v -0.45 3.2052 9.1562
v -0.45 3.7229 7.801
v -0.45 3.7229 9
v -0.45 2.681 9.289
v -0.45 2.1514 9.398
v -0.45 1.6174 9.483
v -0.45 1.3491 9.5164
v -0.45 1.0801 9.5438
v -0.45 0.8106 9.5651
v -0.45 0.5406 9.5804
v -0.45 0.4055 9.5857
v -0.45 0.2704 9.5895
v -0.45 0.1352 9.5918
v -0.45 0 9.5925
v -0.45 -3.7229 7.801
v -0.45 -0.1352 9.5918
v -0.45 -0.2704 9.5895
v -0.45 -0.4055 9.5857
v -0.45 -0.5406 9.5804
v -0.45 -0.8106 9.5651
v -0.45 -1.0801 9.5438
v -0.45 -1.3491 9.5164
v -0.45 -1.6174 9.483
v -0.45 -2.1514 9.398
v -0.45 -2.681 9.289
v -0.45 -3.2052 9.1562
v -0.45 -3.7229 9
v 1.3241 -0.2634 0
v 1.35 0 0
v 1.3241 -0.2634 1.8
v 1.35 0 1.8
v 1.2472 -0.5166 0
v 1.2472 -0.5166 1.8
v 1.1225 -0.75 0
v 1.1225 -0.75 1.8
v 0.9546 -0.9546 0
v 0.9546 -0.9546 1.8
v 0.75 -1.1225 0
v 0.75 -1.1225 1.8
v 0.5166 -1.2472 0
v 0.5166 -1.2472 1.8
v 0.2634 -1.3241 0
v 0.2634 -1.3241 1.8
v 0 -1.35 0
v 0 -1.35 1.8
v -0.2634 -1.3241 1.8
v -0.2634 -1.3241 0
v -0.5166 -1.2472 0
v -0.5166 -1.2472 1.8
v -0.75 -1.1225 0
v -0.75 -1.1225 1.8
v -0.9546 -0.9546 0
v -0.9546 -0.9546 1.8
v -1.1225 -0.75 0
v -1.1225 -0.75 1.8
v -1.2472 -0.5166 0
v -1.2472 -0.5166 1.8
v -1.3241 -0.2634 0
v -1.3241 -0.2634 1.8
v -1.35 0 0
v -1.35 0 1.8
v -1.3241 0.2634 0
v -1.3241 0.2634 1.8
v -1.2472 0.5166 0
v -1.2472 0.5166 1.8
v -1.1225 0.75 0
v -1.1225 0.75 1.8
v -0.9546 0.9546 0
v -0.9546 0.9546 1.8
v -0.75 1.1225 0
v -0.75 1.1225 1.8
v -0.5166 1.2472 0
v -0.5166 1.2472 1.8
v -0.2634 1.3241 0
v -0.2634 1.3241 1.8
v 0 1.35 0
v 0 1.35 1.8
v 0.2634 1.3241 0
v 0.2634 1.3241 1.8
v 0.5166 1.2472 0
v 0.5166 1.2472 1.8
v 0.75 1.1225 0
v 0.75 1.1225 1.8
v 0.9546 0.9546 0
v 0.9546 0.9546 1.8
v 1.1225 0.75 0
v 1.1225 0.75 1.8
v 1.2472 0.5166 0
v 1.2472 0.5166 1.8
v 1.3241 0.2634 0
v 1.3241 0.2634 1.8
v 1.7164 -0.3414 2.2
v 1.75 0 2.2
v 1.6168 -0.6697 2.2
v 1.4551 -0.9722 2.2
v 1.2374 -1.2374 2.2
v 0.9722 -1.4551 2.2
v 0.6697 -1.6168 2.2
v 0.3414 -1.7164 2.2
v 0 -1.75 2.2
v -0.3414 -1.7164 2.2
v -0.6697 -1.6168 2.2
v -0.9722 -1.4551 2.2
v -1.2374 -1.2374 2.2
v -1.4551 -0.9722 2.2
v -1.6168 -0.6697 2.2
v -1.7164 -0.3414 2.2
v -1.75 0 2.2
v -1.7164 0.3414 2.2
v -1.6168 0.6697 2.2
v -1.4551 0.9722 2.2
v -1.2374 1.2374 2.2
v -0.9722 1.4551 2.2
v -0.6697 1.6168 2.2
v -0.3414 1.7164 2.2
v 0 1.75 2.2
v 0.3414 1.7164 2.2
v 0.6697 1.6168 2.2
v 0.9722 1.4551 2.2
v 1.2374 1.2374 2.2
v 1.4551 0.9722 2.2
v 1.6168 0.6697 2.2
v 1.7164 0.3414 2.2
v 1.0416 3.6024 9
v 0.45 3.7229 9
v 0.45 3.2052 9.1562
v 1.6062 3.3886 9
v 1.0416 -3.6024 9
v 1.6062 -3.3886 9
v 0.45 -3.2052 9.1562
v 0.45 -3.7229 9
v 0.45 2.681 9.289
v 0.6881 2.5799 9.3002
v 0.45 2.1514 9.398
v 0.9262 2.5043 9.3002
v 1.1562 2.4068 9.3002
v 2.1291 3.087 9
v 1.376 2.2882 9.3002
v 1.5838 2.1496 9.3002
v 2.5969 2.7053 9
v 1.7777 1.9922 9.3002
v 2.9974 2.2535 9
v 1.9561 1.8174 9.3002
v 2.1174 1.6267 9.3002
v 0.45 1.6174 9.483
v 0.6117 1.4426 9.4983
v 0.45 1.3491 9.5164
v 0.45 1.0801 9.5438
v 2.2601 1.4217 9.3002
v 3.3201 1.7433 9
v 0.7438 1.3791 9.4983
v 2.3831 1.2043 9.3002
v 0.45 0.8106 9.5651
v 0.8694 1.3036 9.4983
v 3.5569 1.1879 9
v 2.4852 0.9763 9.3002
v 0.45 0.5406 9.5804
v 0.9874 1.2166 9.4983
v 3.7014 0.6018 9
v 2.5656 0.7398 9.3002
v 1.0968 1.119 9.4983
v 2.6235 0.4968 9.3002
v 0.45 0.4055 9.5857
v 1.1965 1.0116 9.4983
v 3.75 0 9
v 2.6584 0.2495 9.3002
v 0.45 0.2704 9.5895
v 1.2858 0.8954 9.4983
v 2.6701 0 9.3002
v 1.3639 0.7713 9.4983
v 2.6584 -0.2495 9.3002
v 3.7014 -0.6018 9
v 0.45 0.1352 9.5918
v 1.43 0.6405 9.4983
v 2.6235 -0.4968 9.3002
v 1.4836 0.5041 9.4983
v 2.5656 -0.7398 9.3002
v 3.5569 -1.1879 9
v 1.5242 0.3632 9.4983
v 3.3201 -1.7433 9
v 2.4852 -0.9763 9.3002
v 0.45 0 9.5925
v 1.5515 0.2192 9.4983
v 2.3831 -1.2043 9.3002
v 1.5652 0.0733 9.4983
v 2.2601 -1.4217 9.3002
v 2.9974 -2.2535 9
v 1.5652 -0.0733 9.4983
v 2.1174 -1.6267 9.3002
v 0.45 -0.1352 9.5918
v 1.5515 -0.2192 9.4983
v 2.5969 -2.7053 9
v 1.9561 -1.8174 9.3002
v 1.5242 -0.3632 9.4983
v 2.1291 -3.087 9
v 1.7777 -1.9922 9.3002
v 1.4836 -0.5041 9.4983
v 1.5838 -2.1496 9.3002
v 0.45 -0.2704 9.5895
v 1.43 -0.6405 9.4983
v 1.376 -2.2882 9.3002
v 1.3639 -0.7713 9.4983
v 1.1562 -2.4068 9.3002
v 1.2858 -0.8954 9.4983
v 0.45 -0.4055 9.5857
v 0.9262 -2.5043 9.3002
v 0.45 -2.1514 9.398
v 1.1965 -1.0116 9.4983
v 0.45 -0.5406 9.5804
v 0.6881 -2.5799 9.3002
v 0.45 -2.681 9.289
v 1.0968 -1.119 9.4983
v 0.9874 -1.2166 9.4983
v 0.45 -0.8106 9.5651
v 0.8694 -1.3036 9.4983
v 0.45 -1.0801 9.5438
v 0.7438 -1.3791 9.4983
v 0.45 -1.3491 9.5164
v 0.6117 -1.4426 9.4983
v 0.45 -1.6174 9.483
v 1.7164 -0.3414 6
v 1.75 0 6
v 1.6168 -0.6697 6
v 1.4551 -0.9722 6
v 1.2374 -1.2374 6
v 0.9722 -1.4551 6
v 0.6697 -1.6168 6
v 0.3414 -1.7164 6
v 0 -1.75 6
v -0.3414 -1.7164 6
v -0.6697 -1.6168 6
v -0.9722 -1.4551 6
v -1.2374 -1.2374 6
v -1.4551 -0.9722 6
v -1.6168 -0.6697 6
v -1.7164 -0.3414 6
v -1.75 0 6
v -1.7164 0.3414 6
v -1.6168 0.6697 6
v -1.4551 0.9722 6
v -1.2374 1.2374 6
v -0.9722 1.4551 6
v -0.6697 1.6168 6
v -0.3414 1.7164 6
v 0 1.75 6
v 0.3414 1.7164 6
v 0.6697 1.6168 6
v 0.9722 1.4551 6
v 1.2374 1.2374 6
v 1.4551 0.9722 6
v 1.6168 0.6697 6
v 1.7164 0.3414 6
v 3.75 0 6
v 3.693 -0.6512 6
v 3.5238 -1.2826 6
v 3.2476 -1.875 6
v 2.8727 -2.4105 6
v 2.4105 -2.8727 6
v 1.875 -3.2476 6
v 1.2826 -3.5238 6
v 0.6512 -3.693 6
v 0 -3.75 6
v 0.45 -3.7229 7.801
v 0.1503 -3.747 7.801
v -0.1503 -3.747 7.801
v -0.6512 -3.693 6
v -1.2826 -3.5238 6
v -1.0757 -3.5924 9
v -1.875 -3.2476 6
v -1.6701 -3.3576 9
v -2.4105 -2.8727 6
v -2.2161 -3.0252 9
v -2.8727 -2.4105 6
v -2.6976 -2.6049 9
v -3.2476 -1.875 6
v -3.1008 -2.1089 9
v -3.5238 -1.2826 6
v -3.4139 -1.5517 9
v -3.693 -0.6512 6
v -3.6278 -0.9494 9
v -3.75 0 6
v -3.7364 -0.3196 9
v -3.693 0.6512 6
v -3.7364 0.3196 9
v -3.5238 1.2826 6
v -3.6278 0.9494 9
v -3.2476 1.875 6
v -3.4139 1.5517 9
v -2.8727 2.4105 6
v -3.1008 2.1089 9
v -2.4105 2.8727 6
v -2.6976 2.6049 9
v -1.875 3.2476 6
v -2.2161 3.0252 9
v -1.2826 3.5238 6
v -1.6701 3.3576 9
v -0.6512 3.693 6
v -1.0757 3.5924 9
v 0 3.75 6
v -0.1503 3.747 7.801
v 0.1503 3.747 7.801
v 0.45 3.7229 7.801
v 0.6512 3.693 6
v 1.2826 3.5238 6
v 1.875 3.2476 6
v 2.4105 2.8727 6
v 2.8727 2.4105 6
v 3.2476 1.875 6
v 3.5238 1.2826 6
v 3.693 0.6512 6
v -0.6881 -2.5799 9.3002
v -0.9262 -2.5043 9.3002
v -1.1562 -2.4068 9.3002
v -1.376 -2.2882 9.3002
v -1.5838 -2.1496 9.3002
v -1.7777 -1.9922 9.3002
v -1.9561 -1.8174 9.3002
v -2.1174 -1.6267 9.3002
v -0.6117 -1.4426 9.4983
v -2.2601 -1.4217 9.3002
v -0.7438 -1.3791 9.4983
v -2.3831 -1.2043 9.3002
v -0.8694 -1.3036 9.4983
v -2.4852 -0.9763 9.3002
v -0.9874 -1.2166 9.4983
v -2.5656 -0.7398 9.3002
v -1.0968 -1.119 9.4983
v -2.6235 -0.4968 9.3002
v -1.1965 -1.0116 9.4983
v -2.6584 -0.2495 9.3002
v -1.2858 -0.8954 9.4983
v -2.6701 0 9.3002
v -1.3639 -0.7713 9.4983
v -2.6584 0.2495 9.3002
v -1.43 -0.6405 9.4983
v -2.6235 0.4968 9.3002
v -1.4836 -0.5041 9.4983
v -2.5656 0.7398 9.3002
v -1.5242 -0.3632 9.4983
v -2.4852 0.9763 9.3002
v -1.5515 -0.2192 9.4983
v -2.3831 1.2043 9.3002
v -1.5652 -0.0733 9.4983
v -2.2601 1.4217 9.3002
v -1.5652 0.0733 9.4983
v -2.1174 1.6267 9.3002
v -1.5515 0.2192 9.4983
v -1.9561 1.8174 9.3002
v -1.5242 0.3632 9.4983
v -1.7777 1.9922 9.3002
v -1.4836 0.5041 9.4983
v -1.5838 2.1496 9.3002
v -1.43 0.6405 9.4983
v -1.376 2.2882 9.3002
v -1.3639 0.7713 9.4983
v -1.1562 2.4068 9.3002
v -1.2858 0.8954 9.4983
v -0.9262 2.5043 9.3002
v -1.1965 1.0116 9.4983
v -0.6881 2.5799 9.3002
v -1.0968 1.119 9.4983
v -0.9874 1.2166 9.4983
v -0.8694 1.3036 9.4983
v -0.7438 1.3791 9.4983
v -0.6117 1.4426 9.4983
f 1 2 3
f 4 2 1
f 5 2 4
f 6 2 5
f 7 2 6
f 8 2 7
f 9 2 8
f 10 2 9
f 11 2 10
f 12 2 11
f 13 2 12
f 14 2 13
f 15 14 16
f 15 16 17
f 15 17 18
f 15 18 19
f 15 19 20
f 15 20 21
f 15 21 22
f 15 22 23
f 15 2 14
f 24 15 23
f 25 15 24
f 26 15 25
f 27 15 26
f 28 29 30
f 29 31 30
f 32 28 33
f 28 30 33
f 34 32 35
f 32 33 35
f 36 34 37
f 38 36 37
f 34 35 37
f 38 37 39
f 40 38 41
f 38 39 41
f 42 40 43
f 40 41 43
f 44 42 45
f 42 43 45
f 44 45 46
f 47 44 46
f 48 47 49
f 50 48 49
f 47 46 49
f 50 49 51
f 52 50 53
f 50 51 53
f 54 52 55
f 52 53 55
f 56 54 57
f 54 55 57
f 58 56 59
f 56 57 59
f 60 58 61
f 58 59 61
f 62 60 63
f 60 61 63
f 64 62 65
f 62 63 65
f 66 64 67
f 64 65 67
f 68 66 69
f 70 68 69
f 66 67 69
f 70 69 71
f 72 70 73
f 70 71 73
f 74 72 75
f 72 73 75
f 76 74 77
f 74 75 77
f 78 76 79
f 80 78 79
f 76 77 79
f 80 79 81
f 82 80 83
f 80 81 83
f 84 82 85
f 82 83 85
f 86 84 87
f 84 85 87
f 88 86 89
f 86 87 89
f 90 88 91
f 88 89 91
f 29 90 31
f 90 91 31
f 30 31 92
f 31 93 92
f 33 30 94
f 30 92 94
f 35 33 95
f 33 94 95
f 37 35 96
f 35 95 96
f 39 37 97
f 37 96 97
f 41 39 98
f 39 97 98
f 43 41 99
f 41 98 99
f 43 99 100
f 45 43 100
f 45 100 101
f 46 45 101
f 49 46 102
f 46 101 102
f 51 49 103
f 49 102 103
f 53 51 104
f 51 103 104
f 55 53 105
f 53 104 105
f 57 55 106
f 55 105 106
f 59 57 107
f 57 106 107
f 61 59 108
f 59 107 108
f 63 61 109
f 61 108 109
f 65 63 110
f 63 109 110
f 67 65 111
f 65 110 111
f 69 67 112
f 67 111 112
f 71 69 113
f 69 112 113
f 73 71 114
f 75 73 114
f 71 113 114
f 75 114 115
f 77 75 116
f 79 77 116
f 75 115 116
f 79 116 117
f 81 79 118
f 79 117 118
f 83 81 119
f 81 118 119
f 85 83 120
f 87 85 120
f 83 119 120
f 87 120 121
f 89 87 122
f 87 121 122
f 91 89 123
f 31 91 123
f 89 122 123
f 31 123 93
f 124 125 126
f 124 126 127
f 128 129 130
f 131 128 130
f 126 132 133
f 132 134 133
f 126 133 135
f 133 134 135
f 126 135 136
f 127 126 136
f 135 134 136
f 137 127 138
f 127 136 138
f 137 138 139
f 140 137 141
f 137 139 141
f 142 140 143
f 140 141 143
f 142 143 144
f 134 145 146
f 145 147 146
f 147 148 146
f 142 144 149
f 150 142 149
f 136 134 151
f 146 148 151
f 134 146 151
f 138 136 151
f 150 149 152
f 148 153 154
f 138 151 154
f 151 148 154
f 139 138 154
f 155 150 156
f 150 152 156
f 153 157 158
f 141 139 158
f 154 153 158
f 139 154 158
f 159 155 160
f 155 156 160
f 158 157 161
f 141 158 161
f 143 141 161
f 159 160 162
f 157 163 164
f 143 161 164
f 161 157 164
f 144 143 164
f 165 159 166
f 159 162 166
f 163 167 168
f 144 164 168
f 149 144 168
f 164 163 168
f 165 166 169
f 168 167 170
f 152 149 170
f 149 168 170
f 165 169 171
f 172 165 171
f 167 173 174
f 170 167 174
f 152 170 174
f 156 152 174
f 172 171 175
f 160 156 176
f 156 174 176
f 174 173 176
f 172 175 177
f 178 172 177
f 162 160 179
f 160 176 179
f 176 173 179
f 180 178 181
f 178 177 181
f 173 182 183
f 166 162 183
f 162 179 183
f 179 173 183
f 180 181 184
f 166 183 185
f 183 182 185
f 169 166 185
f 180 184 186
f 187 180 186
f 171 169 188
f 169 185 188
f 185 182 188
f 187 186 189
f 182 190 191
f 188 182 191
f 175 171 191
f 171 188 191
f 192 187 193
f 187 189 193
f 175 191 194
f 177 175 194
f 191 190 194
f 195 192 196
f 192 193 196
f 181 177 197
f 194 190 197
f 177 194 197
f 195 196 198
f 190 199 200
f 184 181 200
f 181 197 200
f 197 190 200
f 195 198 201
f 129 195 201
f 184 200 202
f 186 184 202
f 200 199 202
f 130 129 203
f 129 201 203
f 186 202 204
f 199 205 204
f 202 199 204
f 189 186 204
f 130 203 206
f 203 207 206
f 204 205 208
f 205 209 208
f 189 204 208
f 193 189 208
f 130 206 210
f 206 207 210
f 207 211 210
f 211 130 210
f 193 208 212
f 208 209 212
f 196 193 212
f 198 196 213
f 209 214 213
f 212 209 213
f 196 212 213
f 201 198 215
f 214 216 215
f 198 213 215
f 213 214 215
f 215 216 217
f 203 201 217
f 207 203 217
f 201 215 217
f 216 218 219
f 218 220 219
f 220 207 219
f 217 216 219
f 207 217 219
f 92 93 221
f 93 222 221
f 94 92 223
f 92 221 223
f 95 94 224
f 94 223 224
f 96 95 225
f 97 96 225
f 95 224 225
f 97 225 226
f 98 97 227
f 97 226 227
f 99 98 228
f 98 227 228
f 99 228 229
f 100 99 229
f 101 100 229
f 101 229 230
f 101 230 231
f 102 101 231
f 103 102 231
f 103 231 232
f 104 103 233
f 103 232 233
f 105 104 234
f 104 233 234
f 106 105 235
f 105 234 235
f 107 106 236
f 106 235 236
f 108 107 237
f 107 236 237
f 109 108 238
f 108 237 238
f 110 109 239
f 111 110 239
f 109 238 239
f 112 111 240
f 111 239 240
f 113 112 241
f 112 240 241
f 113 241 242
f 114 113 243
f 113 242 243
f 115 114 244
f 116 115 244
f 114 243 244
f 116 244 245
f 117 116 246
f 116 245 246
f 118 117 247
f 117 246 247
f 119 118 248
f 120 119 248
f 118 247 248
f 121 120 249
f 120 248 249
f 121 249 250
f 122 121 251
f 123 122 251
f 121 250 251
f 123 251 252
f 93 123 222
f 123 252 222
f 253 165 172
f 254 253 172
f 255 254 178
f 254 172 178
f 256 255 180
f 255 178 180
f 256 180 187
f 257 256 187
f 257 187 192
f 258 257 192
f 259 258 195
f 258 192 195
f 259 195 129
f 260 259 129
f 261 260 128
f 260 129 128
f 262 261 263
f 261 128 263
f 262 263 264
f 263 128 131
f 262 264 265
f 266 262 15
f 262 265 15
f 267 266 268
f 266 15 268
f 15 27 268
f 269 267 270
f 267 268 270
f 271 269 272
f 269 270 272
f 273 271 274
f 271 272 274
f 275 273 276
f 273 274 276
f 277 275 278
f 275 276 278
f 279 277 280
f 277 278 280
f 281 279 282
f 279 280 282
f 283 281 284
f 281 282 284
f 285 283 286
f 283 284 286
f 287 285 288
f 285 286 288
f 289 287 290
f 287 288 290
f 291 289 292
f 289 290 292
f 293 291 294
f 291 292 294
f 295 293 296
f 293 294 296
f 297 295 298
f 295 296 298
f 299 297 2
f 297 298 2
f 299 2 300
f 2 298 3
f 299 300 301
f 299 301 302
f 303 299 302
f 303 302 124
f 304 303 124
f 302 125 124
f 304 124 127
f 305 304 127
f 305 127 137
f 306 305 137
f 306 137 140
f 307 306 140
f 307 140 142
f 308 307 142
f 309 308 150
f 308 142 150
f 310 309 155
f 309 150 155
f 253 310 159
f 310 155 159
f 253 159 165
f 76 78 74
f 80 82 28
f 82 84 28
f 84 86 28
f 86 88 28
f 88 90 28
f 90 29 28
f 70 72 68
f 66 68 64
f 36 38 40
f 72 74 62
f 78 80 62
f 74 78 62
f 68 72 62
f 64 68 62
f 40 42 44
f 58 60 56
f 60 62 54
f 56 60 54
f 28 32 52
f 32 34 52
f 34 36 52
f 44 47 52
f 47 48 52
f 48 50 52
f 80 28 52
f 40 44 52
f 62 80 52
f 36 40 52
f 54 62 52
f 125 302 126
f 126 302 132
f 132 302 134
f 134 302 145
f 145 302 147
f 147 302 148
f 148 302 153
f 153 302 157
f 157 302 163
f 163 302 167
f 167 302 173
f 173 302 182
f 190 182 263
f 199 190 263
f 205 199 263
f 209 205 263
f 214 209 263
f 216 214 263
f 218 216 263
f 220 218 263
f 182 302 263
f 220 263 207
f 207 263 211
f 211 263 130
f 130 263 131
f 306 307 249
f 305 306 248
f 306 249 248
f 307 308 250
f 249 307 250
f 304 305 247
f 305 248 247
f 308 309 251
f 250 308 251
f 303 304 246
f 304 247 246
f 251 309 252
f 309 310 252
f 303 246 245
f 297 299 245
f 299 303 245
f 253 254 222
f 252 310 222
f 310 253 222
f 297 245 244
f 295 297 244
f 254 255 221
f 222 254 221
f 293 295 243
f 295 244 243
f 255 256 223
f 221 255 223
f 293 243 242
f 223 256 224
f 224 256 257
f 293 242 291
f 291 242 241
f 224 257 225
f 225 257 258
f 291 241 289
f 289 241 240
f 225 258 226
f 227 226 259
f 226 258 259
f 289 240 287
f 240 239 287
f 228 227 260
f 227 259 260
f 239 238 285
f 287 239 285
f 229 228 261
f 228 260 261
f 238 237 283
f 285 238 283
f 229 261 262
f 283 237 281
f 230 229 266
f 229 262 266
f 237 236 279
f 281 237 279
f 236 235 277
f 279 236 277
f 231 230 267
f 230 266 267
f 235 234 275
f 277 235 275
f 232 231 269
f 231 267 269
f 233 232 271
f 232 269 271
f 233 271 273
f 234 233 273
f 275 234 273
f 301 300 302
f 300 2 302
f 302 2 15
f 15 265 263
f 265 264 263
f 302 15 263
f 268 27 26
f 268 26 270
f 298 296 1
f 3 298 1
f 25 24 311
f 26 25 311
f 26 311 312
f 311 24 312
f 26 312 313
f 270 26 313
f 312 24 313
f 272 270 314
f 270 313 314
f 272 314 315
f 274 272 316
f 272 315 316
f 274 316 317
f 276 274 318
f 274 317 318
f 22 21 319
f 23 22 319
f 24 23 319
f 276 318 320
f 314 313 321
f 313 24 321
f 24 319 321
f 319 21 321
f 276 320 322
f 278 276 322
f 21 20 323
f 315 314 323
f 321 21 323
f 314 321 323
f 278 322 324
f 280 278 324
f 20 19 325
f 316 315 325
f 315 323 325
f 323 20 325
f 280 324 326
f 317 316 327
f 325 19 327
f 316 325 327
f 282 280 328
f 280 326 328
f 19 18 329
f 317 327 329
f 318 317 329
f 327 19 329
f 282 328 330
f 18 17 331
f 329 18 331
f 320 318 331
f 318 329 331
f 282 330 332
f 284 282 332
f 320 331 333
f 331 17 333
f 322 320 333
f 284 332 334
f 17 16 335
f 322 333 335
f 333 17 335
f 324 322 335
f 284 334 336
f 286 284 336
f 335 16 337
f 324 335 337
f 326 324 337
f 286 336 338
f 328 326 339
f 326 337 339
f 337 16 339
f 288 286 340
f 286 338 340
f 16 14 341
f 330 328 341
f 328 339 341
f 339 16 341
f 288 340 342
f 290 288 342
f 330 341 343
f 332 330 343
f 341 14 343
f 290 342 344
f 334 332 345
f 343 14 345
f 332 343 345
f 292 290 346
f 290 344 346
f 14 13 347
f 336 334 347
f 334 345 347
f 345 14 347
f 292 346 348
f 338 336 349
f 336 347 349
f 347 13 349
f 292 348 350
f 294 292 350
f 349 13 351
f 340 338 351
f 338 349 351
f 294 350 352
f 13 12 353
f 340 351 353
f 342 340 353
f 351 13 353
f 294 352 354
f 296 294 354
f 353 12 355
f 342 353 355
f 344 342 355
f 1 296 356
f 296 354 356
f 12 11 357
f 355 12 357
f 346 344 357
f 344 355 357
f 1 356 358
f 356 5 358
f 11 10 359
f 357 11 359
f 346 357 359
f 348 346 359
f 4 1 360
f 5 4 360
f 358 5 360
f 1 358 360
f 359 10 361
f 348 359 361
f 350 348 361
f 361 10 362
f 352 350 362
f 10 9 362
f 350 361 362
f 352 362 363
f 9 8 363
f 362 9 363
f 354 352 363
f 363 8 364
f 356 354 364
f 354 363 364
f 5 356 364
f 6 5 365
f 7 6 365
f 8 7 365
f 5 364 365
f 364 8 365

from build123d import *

# Parameters (mm, degrees)
F2_W     = 0.3
F2_H     = 0.65
F3_DEPTH = 12.5
F4_SCALE = 3


with BuildPart() as f1:
    # F0 (on Front) → F1 (revolve)
    with BuildSketch(Plane.XZ):
        Polygon((0, 3), (0, 0), (0.45, 0), (0.45, 0.6), (0.5833333333, 0.7333333333), (0.5833333333, 2), (1.25, 2), (1.25, 3), align=None)
        with BuildLine():
            Line((0, 3.2003289616), (0, 3))
            Line((0, 3), (1.25, 3))
            ThreePointArc((1.25, 3), (0.6329754523, 3.1499292043), (0, 3.2003289616))
        make_face()
    revolve(axis=Axis((0, 0, 1.5), (0, 0, -1)))

    # F2 (on Front) → F3 (cut, symmetric)
    with BuildSketch(Plane.XZ):
        with Locations((0, 2.9253289616)):
            Rectangle(F2_W, F2_H)
    extrude(amount=F3_DEPTH, both=True, mode=Mode.SUBTRACT)


with BuildPart() as f1_1:
    # F4: moved
    add(f1.part.scale(F4_SCALE))


solid = f1_1.part
